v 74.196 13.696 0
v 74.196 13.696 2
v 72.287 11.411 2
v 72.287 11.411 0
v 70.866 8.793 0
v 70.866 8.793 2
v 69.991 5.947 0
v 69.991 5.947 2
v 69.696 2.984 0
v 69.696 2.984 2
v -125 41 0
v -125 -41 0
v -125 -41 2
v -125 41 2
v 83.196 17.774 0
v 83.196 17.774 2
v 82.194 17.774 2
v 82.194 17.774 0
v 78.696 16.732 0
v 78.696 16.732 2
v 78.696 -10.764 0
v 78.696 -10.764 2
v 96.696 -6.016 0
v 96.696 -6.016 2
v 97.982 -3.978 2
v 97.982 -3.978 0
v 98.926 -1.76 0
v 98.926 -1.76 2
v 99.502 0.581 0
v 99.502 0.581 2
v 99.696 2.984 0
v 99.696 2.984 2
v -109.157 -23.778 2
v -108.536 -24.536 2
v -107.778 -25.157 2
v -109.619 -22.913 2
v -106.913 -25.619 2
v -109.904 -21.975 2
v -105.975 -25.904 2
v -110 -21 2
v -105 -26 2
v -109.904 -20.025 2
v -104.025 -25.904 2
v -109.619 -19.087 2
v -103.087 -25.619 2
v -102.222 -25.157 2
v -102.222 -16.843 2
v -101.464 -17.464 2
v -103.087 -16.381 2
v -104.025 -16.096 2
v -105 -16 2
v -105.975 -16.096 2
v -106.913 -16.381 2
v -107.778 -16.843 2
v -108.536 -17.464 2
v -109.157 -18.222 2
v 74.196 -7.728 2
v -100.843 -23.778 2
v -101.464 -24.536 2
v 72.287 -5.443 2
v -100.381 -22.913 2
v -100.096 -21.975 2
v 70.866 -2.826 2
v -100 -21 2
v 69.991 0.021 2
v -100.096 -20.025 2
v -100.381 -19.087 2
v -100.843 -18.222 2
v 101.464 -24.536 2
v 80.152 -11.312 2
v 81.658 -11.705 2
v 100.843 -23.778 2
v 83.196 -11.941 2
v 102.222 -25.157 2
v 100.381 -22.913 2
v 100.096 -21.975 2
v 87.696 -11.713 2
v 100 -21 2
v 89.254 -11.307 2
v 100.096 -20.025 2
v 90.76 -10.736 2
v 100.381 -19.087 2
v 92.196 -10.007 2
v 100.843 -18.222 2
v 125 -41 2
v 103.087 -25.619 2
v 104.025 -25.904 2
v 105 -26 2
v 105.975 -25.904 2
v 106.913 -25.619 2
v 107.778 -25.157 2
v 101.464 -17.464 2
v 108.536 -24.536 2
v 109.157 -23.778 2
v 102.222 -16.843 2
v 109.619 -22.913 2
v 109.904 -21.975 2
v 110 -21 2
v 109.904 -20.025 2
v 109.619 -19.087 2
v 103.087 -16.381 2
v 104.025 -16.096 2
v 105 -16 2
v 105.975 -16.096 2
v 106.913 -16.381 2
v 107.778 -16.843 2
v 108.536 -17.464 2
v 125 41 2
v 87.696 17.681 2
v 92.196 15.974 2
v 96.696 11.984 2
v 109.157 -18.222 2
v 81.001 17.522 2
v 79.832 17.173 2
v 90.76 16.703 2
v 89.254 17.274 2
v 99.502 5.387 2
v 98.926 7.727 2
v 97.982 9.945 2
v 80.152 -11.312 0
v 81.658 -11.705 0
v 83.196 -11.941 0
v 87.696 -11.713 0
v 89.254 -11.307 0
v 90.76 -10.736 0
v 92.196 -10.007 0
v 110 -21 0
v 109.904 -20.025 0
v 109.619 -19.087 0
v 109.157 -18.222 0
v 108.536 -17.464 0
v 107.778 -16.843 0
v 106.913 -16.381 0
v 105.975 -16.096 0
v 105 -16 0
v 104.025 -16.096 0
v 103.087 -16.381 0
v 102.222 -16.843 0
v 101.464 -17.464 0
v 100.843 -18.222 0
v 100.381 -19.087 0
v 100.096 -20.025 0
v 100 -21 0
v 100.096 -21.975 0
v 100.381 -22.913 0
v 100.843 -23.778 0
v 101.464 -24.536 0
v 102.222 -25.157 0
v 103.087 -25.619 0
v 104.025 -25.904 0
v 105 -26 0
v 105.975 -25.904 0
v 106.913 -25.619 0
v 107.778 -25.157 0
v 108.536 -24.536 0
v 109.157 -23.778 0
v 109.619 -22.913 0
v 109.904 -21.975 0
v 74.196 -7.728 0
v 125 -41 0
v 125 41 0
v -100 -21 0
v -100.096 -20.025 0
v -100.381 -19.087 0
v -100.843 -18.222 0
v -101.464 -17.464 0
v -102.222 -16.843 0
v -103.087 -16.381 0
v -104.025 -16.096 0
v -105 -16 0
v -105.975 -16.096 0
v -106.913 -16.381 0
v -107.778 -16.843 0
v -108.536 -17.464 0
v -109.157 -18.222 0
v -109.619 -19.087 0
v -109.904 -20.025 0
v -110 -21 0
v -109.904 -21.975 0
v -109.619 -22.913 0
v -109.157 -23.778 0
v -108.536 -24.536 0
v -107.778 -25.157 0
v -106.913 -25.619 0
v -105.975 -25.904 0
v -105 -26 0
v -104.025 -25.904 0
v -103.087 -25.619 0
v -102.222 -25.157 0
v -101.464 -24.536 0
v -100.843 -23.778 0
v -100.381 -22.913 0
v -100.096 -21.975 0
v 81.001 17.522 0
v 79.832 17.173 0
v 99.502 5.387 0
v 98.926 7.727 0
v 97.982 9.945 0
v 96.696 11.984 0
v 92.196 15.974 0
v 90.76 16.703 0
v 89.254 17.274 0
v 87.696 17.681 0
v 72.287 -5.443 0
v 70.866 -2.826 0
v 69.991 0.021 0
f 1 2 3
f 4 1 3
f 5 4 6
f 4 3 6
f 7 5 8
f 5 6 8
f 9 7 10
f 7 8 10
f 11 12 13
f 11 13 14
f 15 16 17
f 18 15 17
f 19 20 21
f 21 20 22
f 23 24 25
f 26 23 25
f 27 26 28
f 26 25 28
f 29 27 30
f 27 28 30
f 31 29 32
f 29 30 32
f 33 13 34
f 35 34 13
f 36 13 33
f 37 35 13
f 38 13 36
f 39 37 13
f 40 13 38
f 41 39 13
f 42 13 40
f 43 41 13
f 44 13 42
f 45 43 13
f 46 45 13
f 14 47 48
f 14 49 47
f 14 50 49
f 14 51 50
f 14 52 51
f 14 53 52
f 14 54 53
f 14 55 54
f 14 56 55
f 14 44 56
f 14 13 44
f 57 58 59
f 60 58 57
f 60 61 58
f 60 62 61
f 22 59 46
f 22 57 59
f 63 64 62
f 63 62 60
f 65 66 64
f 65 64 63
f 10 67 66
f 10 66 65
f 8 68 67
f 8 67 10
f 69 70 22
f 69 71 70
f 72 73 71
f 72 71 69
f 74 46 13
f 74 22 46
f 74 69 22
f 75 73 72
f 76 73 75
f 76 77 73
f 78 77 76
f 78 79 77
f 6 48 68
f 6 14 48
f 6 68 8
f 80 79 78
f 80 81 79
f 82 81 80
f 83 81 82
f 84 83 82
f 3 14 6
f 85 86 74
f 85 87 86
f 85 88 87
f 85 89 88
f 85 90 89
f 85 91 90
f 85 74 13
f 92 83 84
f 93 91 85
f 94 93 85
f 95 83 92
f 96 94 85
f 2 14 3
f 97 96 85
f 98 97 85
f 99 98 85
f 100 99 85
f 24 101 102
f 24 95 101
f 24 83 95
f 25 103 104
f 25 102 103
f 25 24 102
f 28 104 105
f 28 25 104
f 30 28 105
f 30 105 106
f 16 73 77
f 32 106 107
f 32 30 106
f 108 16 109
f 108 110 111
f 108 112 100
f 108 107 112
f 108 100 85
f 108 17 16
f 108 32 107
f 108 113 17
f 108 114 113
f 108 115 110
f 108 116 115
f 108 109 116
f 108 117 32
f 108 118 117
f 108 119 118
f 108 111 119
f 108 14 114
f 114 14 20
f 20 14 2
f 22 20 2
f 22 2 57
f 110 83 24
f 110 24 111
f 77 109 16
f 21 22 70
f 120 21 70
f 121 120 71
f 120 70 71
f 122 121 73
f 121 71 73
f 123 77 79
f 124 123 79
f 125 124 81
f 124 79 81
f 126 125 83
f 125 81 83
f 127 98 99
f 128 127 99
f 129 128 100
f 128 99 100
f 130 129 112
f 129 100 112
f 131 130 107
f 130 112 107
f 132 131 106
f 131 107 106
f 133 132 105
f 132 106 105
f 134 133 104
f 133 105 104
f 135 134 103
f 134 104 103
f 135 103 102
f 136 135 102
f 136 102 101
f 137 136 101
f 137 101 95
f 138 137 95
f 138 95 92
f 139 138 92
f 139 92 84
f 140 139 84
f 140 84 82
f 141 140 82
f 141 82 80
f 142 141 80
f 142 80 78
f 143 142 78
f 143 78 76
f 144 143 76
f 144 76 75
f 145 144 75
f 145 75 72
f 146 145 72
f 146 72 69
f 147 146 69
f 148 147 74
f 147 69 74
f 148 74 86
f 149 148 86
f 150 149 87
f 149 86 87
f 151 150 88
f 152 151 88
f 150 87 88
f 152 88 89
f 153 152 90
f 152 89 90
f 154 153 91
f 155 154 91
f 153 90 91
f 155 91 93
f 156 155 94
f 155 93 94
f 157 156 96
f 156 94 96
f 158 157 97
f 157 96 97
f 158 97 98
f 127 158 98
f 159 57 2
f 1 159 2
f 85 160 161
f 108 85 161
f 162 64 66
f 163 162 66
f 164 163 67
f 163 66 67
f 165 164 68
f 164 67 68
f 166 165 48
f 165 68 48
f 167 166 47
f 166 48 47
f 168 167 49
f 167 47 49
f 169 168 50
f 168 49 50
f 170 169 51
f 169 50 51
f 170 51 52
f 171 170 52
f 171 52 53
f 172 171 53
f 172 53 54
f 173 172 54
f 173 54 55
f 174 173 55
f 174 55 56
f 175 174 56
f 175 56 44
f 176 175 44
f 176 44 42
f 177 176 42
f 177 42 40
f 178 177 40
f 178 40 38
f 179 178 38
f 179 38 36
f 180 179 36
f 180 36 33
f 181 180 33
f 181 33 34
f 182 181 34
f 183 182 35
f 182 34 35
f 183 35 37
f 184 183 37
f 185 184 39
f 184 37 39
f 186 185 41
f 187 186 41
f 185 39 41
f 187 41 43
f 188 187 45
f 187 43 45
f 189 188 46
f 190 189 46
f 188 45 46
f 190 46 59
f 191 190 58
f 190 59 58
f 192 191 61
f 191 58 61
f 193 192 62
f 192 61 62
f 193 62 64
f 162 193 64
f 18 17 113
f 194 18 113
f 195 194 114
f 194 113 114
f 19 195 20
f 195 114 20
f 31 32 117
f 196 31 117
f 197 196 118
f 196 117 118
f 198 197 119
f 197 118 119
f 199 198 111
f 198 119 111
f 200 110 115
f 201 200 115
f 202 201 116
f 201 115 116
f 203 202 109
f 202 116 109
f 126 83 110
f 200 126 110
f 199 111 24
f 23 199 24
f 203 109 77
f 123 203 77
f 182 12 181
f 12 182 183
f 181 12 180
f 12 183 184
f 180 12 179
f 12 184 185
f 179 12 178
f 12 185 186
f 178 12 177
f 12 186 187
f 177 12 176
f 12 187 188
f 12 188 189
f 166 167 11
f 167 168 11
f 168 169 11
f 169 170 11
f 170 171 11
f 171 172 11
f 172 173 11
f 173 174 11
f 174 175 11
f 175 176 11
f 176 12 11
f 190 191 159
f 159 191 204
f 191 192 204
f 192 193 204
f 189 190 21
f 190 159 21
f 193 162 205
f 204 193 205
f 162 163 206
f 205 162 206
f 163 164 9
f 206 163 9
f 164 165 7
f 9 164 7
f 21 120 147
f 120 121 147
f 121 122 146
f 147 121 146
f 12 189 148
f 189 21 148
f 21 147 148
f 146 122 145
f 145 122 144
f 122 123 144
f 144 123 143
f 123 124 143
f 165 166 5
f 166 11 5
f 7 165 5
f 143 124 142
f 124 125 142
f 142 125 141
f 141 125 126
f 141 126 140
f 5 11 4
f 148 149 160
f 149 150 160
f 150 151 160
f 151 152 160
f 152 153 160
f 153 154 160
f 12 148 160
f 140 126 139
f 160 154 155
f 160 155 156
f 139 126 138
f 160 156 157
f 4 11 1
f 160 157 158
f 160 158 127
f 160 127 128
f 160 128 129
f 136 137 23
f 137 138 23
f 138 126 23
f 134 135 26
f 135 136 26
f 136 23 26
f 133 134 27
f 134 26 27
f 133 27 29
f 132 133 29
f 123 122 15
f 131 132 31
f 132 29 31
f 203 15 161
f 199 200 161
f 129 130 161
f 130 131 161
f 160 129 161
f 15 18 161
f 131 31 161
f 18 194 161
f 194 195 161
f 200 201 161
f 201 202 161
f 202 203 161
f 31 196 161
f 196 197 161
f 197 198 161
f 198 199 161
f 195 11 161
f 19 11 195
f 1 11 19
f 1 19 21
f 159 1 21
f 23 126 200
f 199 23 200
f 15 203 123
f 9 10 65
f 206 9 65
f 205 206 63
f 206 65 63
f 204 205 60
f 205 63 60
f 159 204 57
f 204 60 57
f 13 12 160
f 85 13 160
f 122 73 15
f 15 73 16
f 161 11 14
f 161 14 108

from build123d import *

# Parameters (mm, degrees)
SKETCH1_W           = 250
SKETCH1_H           = 82
BOSS_EXTRUDE1_DEPTH = 2
CUT_EXTRUDE1_DEPTH  = 3
SKETCH3_R           = 5
CUT_EXTRUDE2_DEPTH  = 3


with BuildPart() as part:
    # Sketch1 → Boss-Extrude1 (new body)
    with BuildSketch(Plane.XY):
        Rectangle(SKETCH1_W, SKETCH1_H)
    extrude(amount=BOSS_EXTRUDE1_DEPTH)

    # Sketch2 → Cut-Extrude1 (cut)
    with BuildSketch(Plane.XY.offset(2)):
        with BuildLine():
            ThreePointArc((74.195797737, 13.695923098), (70.866481051, 8.793255475), (69.695797737, 2.983780456))
            ThreePointArc((69.695797737, 2.983780456), (70.866481051, -2.825694564), (74.195797737, -7.728362187))
            Line((74.195797737, -7.728362187), (74.195797737, 13.695923098))
        make_face()
        with BuildLine():
            Line((83.195797737, 17.773650373), (82.193848931, 17.773650373))
            ThreePointArc((82.193848931, 17.773650373), (80.413006732, 17.359374398), (78.695797737, 16.73150754))
            Line((78.695797737, 16.73150754), (78.695797737, -10.763946629))
            ThreePointArc((78.695797737, -10.763946629), (80.899894424, -11.527977468), (83.195797737, -11.941031101))
            Line((83.195797737, -11.941031101), (83.195797737, 17.773650373))
        make_face()
        with BuildLine():
            ThreePointArc((92.195797737, 15.974161512), (90.014687146, 17.009093837), (87.695797737, 17.680718912))
            Line((87.695797737, 17.680718912), (87.695797737, -11.713158001))
            ThreePointArc((87.695797737, -11.713158001), (90.014687146, -11.041532926), (92.195797737, -10.006600601))
            Line((92.195797737, -10.006600601), (92.195797737, 15.974161512))
        make_face()
        with BuildLine():
            ThreePointArc((99.695797737, 2.983780456), (98.926047208, 7.727196946), (96.695797737, 11.983780456))
            Line((96.695797737, 11.983780456), (96.695797737, -6.016219544))
            ThreePointArc((96.695797737, -6.016219544), (98.926047208, -1.759636035), (99.695797737, 2.983780456))
        make_face()
    extrude(amount=-CUT_EXTRUDE1_DEPTH, mode=Mode.SUBTRACT)

    # Sketch3 → Cut-Extrude2 (cut)
    with BuildSketch(Plane.XY.offset(2)):
        with Locations((-105, -21)):
            Circle(SKETCH3_R)
        with Locations((105, -21)):
            Circle(SKETCH3_R)
    extrude(amount=-CUT_EXTRUDE2_DEPTH, mode=Mode.SUBTRACT)


solid = part.part
